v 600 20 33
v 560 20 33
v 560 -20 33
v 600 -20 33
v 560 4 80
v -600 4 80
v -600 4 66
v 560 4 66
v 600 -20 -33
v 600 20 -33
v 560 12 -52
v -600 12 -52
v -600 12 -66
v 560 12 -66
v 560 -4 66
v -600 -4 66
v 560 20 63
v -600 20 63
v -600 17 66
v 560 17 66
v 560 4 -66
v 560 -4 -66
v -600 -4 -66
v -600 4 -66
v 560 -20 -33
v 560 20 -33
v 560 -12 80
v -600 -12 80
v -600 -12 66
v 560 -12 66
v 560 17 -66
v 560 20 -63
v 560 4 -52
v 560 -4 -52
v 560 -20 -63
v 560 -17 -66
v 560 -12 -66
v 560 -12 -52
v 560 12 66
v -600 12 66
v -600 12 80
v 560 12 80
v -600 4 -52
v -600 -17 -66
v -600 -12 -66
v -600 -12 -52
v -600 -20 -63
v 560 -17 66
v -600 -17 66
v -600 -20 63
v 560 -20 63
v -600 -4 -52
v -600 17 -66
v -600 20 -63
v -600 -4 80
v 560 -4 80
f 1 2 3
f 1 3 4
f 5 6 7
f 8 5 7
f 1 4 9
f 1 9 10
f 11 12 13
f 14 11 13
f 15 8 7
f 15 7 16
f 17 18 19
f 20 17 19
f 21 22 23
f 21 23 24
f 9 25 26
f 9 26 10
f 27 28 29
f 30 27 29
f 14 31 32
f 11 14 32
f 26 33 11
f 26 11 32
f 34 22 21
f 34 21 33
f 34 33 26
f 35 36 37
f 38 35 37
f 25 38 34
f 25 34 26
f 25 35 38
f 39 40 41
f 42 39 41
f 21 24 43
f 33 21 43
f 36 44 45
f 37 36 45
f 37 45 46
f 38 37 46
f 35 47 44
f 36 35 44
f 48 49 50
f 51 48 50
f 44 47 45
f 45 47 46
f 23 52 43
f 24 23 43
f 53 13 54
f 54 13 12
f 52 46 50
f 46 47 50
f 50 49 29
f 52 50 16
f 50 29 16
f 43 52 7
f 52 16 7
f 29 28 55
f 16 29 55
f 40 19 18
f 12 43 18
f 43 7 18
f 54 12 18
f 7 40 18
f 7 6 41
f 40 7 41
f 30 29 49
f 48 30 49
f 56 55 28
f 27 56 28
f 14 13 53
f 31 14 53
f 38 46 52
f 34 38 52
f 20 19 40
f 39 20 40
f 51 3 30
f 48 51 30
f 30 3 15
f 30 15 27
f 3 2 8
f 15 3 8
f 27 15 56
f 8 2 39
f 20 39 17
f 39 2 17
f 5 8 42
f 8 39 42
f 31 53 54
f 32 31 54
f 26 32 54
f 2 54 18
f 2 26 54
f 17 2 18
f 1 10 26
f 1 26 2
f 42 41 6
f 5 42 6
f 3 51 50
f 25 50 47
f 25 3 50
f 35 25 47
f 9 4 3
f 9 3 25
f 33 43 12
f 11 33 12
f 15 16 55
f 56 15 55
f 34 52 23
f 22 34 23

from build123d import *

# Parameters (mm, degrees)
F1_W     = 40
F1_H     = 33
F3_DEPTH = 600
F2_W     = 80
F2_H     = 100
F4_DEPTH = 25


with BuildPart() as f3:
    # F1 (on Right) → F3 (new body, symmetric)
    with BuildSketch(Plane.YZ):
        Polygon((20, 33), (20, 63), (17, 66), (12, 66), (12, 80), (4, 80), (4, 66), (-4, 66), (-4, 80), (-12, 80), (-12, 66), (-17, 66), (-20, 63), (-20, 33), align=None)
        with Locations((0, 16.5)):
            Rectangle(F1_W, F1_H)
        with Locations((0, -16.5)):
            Rectangle(F1_W, F1_H)
        Polygon((20, -63), (20, -33), (-20, -33), (-20, -63), (-17, -66), (-12, -66), (-12, -52), (-4, -52), (-4, -66), (4, -66), (4, -52), (12, -52), (12, -66), (17, -66), align=None)
    extrude(amount=F3_DEPTH, both=True)

    # F2 (on Front) → F4 (cut, symmetric)
    with BuildSketch(Plane.XZ):
        with Locations((600, 83)):
            Rectangle(F2_W, F2_H)
        with Locations((600, -83)):
            Rectangle(F2_W, F2_H)
    extrude(amount=F4_DEPTH, both=True, mode=Mode.SUBTRACT)


solid = f3.part
